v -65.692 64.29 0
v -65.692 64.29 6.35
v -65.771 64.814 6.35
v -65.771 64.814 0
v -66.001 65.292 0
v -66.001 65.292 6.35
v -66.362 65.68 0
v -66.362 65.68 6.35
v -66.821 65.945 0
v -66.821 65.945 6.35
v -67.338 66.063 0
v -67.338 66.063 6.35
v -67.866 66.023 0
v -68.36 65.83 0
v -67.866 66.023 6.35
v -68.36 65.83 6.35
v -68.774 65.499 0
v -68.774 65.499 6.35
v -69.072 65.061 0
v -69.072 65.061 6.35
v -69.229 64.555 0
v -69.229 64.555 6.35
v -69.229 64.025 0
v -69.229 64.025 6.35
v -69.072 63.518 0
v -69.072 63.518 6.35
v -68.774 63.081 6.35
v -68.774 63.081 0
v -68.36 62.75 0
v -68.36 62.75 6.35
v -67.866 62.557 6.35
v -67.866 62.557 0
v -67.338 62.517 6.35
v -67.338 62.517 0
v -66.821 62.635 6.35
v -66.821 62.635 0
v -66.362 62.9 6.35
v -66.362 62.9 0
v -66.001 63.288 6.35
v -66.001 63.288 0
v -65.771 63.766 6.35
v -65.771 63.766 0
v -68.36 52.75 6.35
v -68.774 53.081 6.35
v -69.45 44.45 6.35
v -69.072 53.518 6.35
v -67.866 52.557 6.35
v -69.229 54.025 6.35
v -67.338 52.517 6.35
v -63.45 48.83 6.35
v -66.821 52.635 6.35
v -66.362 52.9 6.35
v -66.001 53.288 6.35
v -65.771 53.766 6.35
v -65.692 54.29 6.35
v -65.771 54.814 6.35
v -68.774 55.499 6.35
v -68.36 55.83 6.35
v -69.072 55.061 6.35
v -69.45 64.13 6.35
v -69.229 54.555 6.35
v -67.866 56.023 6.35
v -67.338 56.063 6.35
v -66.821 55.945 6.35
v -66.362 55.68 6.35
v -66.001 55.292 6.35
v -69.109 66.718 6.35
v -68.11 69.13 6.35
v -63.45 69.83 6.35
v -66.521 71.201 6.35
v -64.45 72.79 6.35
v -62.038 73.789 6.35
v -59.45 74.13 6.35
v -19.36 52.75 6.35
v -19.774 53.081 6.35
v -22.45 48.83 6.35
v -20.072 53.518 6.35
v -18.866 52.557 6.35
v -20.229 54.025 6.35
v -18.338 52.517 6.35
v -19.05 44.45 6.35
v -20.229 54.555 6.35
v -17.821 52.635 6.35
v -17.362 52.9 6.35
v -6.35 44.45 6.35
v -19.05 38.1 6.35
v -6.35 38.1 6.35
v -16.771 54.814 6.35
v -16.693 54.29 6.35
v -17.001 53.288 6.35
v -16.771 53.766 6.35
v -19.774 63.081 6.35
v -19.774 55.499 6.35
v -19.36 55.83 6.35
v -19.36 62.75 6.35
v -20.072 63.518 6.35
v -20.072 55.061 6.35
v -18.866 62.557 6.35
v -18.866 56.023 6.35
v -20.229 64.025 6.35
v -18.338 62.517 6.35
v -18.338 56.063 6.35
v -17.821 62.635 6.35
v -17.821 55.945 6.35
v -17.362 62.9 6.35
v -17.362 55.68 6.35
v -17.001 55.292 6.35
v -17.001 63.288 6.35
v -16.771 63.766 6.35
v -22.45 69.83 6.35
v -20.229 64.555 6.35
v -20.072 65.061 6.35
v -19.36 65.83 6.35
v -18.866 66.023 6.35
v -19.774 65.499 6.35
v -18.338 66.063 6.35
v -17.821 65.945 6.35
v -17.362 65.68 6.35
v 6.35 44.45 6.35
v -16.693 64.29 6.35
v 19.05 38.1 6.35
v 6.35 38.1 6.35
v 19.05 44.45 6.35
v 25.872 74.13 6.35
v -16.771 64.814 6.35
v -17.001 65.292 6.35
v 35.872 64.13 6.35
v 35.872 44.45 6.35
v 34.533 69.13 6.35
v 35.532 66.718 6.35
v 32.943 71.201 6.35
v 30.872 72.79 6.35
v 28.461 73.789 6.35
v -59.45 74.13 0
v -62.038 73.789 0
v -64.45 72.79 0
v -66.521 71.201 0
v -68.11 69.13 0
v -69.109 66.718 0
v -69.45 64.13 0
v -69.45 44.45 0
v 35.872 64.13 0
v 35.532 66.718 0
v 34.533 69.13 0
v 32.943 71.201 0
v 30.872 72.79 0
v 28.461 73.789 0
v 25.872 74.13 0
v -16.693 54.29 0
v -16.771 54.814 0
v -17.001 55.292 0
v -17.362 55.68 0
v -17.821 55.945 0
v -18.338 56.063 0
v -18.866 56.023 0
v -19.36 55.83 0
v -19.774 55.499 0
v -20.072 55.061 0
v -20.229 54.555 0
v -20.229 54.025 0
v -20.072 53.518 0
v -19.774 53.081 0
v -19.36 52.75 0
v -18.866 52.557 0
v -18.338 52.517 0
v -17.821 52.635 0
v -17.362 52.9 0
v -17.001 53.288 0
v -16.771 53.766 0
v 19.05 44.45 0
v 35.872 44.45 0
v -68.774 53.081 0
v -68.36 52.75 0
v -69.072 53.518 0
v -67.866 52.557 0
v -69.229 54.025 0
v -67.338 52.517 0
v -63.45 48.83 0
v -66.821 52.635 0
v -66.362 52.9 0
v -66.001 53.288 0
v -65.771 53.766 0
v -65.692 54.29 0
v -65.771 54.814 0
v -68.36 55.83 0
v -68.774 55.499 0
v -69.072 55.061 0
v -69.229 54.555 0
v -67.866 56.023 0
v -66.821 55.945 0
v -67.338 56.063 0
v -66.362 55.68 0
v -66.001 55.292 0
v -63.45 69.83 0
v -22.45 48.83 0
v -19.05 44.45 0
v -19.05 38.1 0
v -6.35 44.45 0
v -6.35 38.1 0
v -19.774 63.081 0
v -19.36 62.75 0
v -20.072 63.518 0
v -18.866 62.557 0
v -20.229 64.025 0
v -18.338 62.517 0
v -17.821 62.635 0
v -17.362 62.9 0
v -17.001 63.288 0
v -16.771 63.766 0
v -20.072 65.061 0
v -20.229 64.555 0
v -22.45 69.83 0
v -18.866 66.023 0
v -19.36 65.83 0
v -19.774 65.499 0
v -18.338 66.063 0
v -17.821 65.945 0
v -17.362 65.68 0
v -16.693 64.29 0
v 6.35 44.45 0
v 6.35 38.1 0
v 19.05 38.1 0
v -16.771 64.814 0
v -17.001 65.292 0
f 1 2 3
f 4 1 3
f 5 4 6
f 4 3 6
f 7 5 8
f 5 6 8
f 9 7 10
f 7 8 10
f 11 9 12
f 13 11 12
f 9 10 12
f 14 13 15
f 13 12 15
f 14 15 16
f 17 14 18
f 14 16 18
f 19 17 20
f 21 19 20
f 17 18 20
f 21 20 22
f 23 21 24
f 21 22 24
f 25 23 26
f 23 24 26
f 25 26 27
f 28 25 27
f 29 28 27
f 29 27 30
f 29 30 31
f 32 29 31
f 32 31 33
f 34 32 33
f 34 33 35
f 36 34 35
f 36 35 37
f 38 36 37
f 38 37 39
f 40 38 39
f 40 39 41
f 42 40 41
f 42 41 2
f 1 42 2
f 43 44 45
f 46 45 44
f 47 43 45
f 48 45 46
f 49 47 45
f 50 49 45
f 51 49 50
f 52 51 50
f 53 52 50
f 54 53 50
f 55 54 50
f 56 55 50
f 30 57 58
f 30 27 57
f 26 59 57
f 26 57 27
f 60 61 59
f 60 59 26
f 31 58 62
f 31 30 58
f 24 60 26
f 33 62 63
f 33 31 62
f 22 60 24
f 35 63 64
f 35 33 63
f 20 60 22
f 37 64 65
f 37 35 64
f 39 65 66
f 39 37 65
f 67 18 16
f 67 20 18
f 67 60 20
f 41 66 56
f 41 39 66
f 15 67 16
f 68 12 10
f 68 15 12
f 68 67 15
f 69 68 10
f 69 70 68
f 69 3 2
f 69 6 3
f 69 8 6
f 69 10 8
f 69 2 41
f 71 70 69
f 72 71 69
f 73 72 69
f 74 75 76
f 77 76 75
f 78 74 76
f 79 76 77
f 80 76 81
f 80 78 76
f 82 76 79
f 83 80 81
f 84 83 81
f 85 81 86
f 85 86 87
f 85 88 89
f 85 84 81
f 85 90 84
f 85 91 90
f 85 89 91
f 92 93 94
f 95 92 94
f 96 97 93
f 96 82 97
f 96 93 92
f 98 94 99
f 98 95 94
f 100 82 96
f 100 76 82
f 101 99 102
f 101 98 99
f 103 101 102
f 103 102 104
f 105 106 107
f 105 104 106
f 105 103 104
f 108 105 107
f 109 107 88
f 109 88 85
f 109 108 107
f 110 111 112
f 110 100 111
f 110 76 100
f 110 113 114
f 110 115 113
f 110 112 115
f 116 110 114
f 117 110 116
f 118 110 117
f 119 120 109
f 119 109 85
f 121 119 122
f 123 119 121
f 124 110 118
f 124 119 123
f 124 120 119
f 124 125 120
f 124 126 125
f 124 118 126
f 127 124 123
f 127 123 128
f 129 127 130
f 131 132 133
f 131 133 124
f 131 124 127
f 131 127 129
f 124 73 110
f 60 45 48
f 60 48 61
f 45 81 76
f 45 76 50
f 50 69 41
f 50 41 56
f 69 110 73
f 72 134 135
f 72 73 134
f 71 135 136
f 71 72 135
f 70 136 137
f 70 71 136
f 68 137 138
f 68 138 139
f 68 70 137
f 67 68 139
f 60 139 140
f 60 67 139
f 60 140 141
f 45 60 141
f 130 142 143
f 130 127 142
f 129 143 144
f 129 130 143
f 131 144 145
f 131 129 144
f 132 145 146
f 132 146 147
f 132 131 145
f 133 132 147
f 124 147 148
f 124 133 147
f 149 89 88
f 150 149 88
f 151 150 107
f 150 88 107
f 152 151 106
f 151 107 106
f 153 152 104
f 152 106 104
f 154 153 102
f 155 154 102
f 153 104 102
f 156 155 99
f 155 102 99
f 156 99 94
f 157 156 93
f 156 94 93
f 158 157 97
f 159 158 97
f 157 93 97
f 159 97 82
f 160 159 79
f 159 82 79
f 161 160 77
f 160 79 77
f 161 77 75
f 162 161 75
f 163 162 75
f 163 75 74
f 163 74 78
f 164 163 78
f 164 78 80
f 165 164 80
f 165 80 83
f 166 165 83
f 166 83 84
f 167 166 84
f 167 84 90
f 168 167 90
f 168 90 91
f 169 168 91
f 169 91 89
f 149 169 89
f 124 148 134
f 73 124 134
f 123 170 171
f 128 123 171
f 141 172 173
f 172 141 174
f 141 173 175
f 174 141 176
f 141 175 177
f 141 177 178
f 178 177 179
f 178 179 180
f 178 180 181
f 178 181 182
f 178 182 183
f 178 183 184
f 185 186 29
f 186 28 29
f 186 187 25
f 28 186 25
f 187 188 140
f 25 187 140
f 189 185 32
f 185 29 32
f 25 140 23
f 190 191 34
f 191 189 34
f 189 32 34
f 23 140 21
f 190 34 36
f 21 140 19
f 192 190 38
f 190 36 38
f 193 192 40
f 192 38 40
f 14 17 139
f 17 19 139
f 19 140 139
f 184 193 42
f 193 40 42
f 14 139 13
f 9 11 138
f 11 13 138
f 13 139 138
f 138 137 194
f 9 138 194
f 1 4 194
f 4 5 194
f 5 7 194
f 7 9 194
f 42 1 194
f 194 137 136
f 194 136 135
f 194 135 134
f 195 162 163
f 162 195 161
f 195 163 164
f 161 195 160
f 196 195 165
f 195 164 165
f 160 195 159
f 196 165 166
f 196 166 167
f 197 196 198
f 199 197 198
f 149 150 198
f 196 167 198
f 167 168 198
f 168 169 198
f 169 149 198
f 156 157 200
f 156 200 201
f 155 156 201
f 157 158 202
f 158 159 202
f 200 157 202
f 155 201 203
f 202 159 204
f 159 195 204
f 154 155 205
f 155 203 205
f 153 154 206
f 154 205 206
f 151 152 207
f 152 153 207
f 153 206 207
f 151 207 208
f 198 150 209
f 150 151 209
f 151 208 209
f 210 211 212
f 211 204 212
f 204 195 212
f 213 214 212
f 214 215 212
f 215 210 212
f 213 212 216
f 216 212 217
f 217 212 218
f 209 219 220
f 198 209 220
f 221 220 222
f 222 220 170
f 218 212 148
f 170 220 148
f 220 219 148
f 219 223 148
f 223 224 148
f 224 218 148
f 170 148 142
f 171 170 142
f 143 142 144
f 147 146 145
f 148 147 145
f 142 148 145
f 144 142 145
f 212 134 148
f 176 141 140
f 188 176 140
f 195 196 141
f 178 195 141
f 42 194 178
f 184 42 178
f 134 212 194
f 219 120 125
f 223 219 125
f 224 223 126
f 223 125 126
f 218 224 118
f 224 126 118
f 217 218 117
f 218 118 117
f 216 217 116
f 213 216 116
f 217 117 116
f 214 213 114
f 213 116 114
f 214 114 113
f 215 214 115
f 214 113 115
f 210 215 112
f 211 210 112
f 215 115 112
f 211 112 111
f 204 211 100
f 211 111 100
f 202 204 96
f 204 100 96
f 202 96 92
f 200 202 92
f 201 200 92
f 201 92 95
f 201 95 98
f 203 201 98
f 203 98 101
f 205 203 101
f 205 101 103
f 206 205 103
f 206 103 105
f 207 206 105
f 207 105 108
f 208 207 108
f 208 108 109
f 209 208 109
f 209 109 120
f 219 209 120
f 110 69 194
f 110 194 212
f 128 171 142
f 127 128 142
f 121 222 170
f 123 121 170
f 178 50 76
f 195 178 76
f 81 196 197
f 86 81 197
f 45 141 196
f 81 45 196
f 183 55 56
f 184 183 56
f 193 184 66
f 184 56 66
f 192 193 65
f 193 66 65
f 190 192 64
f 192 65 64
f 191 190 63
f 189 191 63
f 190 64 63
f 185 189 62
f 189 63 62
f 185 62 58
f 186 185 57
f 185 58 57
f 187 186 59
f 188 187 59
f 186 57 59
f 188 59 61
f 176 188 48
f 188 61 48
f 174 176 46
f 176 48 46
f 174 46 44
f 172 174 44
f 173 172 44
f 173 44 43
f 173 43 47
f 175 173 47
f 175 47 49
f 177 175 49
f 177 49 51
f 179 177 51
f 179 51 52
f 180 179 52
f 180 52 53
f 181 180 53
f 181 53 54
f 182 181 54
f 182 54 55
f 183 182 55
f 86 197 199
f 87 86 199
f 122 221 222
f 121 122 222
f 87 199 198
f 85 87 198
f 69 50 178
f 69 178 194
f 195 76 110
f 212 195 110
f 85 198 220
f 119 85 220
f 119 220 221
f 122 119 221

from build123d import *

# Parameters (mm, degrees)
BOSS_EXTRUDE1_DEPTH = 6.35
SKETCH3_R           = 1.778
SKETCH3_W           = 41
SKETCH3_H           = 21
CUT_EXTRUDE1_DEPTH  = 102.778507746
FILLET1_R           = 10


with BuildPart() as part:
    # Sketch1 → Boss-Extrude1 (new body)
    with BuildSketch(Plane.XY):
        Polygon((19.05, 38.1), (19.05, 44.45), (35.872396717, 44.45), (35.872396717, 74.129883576), (-49.45, 74.129883576), (-69.45, 74.129883576), (-69.45, 44.45), (-44.45, 44.45), (-19.05, 44.45), (-19.05, 38.1), (-6.35, 38.1), (-6.35, 44.45), (6.35, 44.45), (6.35, 38.1), align=None)
    extrude(amount=BOSS_EXTRUDE1_DEPTH)

    # Sketch3 → Cut-Extrude1 (cut, through all)
    with BuildSketch(Plane.XY.offset(6.35)):
        with Locations((-67.4705, 64.289941788)):
            Circle(SKETCH3_R)
        with Locations((-67.4705, 54.289941788)):
            Circle(SKETCH3_R)
        with Locations((-18.4705, 54.289941788)):
            Circle(SKETCH3_R)
        with Locations((-18.4705, 64.289941788)):
            Circle(SKETCH3_R)
        with Locations((-42.95, 59.329883576)):
            Rectangle(SKETCH3_W, SKETCH3_H)
    extrude(amount=-CUT_EXTRUDE1_DEPTH, mode=Mode.SUBTRACT)

    # Fillet1
    fillet1_edges = [part.edges().sort_by_distance(p)[0] for p in [
        (-69.45, 74.129883576, 3.175),
        (35.872396717, 74.129883576, 3.175),
    ]]
    fillet(fillet1_edges, radius=FILLET1_R)


solid = part.part
